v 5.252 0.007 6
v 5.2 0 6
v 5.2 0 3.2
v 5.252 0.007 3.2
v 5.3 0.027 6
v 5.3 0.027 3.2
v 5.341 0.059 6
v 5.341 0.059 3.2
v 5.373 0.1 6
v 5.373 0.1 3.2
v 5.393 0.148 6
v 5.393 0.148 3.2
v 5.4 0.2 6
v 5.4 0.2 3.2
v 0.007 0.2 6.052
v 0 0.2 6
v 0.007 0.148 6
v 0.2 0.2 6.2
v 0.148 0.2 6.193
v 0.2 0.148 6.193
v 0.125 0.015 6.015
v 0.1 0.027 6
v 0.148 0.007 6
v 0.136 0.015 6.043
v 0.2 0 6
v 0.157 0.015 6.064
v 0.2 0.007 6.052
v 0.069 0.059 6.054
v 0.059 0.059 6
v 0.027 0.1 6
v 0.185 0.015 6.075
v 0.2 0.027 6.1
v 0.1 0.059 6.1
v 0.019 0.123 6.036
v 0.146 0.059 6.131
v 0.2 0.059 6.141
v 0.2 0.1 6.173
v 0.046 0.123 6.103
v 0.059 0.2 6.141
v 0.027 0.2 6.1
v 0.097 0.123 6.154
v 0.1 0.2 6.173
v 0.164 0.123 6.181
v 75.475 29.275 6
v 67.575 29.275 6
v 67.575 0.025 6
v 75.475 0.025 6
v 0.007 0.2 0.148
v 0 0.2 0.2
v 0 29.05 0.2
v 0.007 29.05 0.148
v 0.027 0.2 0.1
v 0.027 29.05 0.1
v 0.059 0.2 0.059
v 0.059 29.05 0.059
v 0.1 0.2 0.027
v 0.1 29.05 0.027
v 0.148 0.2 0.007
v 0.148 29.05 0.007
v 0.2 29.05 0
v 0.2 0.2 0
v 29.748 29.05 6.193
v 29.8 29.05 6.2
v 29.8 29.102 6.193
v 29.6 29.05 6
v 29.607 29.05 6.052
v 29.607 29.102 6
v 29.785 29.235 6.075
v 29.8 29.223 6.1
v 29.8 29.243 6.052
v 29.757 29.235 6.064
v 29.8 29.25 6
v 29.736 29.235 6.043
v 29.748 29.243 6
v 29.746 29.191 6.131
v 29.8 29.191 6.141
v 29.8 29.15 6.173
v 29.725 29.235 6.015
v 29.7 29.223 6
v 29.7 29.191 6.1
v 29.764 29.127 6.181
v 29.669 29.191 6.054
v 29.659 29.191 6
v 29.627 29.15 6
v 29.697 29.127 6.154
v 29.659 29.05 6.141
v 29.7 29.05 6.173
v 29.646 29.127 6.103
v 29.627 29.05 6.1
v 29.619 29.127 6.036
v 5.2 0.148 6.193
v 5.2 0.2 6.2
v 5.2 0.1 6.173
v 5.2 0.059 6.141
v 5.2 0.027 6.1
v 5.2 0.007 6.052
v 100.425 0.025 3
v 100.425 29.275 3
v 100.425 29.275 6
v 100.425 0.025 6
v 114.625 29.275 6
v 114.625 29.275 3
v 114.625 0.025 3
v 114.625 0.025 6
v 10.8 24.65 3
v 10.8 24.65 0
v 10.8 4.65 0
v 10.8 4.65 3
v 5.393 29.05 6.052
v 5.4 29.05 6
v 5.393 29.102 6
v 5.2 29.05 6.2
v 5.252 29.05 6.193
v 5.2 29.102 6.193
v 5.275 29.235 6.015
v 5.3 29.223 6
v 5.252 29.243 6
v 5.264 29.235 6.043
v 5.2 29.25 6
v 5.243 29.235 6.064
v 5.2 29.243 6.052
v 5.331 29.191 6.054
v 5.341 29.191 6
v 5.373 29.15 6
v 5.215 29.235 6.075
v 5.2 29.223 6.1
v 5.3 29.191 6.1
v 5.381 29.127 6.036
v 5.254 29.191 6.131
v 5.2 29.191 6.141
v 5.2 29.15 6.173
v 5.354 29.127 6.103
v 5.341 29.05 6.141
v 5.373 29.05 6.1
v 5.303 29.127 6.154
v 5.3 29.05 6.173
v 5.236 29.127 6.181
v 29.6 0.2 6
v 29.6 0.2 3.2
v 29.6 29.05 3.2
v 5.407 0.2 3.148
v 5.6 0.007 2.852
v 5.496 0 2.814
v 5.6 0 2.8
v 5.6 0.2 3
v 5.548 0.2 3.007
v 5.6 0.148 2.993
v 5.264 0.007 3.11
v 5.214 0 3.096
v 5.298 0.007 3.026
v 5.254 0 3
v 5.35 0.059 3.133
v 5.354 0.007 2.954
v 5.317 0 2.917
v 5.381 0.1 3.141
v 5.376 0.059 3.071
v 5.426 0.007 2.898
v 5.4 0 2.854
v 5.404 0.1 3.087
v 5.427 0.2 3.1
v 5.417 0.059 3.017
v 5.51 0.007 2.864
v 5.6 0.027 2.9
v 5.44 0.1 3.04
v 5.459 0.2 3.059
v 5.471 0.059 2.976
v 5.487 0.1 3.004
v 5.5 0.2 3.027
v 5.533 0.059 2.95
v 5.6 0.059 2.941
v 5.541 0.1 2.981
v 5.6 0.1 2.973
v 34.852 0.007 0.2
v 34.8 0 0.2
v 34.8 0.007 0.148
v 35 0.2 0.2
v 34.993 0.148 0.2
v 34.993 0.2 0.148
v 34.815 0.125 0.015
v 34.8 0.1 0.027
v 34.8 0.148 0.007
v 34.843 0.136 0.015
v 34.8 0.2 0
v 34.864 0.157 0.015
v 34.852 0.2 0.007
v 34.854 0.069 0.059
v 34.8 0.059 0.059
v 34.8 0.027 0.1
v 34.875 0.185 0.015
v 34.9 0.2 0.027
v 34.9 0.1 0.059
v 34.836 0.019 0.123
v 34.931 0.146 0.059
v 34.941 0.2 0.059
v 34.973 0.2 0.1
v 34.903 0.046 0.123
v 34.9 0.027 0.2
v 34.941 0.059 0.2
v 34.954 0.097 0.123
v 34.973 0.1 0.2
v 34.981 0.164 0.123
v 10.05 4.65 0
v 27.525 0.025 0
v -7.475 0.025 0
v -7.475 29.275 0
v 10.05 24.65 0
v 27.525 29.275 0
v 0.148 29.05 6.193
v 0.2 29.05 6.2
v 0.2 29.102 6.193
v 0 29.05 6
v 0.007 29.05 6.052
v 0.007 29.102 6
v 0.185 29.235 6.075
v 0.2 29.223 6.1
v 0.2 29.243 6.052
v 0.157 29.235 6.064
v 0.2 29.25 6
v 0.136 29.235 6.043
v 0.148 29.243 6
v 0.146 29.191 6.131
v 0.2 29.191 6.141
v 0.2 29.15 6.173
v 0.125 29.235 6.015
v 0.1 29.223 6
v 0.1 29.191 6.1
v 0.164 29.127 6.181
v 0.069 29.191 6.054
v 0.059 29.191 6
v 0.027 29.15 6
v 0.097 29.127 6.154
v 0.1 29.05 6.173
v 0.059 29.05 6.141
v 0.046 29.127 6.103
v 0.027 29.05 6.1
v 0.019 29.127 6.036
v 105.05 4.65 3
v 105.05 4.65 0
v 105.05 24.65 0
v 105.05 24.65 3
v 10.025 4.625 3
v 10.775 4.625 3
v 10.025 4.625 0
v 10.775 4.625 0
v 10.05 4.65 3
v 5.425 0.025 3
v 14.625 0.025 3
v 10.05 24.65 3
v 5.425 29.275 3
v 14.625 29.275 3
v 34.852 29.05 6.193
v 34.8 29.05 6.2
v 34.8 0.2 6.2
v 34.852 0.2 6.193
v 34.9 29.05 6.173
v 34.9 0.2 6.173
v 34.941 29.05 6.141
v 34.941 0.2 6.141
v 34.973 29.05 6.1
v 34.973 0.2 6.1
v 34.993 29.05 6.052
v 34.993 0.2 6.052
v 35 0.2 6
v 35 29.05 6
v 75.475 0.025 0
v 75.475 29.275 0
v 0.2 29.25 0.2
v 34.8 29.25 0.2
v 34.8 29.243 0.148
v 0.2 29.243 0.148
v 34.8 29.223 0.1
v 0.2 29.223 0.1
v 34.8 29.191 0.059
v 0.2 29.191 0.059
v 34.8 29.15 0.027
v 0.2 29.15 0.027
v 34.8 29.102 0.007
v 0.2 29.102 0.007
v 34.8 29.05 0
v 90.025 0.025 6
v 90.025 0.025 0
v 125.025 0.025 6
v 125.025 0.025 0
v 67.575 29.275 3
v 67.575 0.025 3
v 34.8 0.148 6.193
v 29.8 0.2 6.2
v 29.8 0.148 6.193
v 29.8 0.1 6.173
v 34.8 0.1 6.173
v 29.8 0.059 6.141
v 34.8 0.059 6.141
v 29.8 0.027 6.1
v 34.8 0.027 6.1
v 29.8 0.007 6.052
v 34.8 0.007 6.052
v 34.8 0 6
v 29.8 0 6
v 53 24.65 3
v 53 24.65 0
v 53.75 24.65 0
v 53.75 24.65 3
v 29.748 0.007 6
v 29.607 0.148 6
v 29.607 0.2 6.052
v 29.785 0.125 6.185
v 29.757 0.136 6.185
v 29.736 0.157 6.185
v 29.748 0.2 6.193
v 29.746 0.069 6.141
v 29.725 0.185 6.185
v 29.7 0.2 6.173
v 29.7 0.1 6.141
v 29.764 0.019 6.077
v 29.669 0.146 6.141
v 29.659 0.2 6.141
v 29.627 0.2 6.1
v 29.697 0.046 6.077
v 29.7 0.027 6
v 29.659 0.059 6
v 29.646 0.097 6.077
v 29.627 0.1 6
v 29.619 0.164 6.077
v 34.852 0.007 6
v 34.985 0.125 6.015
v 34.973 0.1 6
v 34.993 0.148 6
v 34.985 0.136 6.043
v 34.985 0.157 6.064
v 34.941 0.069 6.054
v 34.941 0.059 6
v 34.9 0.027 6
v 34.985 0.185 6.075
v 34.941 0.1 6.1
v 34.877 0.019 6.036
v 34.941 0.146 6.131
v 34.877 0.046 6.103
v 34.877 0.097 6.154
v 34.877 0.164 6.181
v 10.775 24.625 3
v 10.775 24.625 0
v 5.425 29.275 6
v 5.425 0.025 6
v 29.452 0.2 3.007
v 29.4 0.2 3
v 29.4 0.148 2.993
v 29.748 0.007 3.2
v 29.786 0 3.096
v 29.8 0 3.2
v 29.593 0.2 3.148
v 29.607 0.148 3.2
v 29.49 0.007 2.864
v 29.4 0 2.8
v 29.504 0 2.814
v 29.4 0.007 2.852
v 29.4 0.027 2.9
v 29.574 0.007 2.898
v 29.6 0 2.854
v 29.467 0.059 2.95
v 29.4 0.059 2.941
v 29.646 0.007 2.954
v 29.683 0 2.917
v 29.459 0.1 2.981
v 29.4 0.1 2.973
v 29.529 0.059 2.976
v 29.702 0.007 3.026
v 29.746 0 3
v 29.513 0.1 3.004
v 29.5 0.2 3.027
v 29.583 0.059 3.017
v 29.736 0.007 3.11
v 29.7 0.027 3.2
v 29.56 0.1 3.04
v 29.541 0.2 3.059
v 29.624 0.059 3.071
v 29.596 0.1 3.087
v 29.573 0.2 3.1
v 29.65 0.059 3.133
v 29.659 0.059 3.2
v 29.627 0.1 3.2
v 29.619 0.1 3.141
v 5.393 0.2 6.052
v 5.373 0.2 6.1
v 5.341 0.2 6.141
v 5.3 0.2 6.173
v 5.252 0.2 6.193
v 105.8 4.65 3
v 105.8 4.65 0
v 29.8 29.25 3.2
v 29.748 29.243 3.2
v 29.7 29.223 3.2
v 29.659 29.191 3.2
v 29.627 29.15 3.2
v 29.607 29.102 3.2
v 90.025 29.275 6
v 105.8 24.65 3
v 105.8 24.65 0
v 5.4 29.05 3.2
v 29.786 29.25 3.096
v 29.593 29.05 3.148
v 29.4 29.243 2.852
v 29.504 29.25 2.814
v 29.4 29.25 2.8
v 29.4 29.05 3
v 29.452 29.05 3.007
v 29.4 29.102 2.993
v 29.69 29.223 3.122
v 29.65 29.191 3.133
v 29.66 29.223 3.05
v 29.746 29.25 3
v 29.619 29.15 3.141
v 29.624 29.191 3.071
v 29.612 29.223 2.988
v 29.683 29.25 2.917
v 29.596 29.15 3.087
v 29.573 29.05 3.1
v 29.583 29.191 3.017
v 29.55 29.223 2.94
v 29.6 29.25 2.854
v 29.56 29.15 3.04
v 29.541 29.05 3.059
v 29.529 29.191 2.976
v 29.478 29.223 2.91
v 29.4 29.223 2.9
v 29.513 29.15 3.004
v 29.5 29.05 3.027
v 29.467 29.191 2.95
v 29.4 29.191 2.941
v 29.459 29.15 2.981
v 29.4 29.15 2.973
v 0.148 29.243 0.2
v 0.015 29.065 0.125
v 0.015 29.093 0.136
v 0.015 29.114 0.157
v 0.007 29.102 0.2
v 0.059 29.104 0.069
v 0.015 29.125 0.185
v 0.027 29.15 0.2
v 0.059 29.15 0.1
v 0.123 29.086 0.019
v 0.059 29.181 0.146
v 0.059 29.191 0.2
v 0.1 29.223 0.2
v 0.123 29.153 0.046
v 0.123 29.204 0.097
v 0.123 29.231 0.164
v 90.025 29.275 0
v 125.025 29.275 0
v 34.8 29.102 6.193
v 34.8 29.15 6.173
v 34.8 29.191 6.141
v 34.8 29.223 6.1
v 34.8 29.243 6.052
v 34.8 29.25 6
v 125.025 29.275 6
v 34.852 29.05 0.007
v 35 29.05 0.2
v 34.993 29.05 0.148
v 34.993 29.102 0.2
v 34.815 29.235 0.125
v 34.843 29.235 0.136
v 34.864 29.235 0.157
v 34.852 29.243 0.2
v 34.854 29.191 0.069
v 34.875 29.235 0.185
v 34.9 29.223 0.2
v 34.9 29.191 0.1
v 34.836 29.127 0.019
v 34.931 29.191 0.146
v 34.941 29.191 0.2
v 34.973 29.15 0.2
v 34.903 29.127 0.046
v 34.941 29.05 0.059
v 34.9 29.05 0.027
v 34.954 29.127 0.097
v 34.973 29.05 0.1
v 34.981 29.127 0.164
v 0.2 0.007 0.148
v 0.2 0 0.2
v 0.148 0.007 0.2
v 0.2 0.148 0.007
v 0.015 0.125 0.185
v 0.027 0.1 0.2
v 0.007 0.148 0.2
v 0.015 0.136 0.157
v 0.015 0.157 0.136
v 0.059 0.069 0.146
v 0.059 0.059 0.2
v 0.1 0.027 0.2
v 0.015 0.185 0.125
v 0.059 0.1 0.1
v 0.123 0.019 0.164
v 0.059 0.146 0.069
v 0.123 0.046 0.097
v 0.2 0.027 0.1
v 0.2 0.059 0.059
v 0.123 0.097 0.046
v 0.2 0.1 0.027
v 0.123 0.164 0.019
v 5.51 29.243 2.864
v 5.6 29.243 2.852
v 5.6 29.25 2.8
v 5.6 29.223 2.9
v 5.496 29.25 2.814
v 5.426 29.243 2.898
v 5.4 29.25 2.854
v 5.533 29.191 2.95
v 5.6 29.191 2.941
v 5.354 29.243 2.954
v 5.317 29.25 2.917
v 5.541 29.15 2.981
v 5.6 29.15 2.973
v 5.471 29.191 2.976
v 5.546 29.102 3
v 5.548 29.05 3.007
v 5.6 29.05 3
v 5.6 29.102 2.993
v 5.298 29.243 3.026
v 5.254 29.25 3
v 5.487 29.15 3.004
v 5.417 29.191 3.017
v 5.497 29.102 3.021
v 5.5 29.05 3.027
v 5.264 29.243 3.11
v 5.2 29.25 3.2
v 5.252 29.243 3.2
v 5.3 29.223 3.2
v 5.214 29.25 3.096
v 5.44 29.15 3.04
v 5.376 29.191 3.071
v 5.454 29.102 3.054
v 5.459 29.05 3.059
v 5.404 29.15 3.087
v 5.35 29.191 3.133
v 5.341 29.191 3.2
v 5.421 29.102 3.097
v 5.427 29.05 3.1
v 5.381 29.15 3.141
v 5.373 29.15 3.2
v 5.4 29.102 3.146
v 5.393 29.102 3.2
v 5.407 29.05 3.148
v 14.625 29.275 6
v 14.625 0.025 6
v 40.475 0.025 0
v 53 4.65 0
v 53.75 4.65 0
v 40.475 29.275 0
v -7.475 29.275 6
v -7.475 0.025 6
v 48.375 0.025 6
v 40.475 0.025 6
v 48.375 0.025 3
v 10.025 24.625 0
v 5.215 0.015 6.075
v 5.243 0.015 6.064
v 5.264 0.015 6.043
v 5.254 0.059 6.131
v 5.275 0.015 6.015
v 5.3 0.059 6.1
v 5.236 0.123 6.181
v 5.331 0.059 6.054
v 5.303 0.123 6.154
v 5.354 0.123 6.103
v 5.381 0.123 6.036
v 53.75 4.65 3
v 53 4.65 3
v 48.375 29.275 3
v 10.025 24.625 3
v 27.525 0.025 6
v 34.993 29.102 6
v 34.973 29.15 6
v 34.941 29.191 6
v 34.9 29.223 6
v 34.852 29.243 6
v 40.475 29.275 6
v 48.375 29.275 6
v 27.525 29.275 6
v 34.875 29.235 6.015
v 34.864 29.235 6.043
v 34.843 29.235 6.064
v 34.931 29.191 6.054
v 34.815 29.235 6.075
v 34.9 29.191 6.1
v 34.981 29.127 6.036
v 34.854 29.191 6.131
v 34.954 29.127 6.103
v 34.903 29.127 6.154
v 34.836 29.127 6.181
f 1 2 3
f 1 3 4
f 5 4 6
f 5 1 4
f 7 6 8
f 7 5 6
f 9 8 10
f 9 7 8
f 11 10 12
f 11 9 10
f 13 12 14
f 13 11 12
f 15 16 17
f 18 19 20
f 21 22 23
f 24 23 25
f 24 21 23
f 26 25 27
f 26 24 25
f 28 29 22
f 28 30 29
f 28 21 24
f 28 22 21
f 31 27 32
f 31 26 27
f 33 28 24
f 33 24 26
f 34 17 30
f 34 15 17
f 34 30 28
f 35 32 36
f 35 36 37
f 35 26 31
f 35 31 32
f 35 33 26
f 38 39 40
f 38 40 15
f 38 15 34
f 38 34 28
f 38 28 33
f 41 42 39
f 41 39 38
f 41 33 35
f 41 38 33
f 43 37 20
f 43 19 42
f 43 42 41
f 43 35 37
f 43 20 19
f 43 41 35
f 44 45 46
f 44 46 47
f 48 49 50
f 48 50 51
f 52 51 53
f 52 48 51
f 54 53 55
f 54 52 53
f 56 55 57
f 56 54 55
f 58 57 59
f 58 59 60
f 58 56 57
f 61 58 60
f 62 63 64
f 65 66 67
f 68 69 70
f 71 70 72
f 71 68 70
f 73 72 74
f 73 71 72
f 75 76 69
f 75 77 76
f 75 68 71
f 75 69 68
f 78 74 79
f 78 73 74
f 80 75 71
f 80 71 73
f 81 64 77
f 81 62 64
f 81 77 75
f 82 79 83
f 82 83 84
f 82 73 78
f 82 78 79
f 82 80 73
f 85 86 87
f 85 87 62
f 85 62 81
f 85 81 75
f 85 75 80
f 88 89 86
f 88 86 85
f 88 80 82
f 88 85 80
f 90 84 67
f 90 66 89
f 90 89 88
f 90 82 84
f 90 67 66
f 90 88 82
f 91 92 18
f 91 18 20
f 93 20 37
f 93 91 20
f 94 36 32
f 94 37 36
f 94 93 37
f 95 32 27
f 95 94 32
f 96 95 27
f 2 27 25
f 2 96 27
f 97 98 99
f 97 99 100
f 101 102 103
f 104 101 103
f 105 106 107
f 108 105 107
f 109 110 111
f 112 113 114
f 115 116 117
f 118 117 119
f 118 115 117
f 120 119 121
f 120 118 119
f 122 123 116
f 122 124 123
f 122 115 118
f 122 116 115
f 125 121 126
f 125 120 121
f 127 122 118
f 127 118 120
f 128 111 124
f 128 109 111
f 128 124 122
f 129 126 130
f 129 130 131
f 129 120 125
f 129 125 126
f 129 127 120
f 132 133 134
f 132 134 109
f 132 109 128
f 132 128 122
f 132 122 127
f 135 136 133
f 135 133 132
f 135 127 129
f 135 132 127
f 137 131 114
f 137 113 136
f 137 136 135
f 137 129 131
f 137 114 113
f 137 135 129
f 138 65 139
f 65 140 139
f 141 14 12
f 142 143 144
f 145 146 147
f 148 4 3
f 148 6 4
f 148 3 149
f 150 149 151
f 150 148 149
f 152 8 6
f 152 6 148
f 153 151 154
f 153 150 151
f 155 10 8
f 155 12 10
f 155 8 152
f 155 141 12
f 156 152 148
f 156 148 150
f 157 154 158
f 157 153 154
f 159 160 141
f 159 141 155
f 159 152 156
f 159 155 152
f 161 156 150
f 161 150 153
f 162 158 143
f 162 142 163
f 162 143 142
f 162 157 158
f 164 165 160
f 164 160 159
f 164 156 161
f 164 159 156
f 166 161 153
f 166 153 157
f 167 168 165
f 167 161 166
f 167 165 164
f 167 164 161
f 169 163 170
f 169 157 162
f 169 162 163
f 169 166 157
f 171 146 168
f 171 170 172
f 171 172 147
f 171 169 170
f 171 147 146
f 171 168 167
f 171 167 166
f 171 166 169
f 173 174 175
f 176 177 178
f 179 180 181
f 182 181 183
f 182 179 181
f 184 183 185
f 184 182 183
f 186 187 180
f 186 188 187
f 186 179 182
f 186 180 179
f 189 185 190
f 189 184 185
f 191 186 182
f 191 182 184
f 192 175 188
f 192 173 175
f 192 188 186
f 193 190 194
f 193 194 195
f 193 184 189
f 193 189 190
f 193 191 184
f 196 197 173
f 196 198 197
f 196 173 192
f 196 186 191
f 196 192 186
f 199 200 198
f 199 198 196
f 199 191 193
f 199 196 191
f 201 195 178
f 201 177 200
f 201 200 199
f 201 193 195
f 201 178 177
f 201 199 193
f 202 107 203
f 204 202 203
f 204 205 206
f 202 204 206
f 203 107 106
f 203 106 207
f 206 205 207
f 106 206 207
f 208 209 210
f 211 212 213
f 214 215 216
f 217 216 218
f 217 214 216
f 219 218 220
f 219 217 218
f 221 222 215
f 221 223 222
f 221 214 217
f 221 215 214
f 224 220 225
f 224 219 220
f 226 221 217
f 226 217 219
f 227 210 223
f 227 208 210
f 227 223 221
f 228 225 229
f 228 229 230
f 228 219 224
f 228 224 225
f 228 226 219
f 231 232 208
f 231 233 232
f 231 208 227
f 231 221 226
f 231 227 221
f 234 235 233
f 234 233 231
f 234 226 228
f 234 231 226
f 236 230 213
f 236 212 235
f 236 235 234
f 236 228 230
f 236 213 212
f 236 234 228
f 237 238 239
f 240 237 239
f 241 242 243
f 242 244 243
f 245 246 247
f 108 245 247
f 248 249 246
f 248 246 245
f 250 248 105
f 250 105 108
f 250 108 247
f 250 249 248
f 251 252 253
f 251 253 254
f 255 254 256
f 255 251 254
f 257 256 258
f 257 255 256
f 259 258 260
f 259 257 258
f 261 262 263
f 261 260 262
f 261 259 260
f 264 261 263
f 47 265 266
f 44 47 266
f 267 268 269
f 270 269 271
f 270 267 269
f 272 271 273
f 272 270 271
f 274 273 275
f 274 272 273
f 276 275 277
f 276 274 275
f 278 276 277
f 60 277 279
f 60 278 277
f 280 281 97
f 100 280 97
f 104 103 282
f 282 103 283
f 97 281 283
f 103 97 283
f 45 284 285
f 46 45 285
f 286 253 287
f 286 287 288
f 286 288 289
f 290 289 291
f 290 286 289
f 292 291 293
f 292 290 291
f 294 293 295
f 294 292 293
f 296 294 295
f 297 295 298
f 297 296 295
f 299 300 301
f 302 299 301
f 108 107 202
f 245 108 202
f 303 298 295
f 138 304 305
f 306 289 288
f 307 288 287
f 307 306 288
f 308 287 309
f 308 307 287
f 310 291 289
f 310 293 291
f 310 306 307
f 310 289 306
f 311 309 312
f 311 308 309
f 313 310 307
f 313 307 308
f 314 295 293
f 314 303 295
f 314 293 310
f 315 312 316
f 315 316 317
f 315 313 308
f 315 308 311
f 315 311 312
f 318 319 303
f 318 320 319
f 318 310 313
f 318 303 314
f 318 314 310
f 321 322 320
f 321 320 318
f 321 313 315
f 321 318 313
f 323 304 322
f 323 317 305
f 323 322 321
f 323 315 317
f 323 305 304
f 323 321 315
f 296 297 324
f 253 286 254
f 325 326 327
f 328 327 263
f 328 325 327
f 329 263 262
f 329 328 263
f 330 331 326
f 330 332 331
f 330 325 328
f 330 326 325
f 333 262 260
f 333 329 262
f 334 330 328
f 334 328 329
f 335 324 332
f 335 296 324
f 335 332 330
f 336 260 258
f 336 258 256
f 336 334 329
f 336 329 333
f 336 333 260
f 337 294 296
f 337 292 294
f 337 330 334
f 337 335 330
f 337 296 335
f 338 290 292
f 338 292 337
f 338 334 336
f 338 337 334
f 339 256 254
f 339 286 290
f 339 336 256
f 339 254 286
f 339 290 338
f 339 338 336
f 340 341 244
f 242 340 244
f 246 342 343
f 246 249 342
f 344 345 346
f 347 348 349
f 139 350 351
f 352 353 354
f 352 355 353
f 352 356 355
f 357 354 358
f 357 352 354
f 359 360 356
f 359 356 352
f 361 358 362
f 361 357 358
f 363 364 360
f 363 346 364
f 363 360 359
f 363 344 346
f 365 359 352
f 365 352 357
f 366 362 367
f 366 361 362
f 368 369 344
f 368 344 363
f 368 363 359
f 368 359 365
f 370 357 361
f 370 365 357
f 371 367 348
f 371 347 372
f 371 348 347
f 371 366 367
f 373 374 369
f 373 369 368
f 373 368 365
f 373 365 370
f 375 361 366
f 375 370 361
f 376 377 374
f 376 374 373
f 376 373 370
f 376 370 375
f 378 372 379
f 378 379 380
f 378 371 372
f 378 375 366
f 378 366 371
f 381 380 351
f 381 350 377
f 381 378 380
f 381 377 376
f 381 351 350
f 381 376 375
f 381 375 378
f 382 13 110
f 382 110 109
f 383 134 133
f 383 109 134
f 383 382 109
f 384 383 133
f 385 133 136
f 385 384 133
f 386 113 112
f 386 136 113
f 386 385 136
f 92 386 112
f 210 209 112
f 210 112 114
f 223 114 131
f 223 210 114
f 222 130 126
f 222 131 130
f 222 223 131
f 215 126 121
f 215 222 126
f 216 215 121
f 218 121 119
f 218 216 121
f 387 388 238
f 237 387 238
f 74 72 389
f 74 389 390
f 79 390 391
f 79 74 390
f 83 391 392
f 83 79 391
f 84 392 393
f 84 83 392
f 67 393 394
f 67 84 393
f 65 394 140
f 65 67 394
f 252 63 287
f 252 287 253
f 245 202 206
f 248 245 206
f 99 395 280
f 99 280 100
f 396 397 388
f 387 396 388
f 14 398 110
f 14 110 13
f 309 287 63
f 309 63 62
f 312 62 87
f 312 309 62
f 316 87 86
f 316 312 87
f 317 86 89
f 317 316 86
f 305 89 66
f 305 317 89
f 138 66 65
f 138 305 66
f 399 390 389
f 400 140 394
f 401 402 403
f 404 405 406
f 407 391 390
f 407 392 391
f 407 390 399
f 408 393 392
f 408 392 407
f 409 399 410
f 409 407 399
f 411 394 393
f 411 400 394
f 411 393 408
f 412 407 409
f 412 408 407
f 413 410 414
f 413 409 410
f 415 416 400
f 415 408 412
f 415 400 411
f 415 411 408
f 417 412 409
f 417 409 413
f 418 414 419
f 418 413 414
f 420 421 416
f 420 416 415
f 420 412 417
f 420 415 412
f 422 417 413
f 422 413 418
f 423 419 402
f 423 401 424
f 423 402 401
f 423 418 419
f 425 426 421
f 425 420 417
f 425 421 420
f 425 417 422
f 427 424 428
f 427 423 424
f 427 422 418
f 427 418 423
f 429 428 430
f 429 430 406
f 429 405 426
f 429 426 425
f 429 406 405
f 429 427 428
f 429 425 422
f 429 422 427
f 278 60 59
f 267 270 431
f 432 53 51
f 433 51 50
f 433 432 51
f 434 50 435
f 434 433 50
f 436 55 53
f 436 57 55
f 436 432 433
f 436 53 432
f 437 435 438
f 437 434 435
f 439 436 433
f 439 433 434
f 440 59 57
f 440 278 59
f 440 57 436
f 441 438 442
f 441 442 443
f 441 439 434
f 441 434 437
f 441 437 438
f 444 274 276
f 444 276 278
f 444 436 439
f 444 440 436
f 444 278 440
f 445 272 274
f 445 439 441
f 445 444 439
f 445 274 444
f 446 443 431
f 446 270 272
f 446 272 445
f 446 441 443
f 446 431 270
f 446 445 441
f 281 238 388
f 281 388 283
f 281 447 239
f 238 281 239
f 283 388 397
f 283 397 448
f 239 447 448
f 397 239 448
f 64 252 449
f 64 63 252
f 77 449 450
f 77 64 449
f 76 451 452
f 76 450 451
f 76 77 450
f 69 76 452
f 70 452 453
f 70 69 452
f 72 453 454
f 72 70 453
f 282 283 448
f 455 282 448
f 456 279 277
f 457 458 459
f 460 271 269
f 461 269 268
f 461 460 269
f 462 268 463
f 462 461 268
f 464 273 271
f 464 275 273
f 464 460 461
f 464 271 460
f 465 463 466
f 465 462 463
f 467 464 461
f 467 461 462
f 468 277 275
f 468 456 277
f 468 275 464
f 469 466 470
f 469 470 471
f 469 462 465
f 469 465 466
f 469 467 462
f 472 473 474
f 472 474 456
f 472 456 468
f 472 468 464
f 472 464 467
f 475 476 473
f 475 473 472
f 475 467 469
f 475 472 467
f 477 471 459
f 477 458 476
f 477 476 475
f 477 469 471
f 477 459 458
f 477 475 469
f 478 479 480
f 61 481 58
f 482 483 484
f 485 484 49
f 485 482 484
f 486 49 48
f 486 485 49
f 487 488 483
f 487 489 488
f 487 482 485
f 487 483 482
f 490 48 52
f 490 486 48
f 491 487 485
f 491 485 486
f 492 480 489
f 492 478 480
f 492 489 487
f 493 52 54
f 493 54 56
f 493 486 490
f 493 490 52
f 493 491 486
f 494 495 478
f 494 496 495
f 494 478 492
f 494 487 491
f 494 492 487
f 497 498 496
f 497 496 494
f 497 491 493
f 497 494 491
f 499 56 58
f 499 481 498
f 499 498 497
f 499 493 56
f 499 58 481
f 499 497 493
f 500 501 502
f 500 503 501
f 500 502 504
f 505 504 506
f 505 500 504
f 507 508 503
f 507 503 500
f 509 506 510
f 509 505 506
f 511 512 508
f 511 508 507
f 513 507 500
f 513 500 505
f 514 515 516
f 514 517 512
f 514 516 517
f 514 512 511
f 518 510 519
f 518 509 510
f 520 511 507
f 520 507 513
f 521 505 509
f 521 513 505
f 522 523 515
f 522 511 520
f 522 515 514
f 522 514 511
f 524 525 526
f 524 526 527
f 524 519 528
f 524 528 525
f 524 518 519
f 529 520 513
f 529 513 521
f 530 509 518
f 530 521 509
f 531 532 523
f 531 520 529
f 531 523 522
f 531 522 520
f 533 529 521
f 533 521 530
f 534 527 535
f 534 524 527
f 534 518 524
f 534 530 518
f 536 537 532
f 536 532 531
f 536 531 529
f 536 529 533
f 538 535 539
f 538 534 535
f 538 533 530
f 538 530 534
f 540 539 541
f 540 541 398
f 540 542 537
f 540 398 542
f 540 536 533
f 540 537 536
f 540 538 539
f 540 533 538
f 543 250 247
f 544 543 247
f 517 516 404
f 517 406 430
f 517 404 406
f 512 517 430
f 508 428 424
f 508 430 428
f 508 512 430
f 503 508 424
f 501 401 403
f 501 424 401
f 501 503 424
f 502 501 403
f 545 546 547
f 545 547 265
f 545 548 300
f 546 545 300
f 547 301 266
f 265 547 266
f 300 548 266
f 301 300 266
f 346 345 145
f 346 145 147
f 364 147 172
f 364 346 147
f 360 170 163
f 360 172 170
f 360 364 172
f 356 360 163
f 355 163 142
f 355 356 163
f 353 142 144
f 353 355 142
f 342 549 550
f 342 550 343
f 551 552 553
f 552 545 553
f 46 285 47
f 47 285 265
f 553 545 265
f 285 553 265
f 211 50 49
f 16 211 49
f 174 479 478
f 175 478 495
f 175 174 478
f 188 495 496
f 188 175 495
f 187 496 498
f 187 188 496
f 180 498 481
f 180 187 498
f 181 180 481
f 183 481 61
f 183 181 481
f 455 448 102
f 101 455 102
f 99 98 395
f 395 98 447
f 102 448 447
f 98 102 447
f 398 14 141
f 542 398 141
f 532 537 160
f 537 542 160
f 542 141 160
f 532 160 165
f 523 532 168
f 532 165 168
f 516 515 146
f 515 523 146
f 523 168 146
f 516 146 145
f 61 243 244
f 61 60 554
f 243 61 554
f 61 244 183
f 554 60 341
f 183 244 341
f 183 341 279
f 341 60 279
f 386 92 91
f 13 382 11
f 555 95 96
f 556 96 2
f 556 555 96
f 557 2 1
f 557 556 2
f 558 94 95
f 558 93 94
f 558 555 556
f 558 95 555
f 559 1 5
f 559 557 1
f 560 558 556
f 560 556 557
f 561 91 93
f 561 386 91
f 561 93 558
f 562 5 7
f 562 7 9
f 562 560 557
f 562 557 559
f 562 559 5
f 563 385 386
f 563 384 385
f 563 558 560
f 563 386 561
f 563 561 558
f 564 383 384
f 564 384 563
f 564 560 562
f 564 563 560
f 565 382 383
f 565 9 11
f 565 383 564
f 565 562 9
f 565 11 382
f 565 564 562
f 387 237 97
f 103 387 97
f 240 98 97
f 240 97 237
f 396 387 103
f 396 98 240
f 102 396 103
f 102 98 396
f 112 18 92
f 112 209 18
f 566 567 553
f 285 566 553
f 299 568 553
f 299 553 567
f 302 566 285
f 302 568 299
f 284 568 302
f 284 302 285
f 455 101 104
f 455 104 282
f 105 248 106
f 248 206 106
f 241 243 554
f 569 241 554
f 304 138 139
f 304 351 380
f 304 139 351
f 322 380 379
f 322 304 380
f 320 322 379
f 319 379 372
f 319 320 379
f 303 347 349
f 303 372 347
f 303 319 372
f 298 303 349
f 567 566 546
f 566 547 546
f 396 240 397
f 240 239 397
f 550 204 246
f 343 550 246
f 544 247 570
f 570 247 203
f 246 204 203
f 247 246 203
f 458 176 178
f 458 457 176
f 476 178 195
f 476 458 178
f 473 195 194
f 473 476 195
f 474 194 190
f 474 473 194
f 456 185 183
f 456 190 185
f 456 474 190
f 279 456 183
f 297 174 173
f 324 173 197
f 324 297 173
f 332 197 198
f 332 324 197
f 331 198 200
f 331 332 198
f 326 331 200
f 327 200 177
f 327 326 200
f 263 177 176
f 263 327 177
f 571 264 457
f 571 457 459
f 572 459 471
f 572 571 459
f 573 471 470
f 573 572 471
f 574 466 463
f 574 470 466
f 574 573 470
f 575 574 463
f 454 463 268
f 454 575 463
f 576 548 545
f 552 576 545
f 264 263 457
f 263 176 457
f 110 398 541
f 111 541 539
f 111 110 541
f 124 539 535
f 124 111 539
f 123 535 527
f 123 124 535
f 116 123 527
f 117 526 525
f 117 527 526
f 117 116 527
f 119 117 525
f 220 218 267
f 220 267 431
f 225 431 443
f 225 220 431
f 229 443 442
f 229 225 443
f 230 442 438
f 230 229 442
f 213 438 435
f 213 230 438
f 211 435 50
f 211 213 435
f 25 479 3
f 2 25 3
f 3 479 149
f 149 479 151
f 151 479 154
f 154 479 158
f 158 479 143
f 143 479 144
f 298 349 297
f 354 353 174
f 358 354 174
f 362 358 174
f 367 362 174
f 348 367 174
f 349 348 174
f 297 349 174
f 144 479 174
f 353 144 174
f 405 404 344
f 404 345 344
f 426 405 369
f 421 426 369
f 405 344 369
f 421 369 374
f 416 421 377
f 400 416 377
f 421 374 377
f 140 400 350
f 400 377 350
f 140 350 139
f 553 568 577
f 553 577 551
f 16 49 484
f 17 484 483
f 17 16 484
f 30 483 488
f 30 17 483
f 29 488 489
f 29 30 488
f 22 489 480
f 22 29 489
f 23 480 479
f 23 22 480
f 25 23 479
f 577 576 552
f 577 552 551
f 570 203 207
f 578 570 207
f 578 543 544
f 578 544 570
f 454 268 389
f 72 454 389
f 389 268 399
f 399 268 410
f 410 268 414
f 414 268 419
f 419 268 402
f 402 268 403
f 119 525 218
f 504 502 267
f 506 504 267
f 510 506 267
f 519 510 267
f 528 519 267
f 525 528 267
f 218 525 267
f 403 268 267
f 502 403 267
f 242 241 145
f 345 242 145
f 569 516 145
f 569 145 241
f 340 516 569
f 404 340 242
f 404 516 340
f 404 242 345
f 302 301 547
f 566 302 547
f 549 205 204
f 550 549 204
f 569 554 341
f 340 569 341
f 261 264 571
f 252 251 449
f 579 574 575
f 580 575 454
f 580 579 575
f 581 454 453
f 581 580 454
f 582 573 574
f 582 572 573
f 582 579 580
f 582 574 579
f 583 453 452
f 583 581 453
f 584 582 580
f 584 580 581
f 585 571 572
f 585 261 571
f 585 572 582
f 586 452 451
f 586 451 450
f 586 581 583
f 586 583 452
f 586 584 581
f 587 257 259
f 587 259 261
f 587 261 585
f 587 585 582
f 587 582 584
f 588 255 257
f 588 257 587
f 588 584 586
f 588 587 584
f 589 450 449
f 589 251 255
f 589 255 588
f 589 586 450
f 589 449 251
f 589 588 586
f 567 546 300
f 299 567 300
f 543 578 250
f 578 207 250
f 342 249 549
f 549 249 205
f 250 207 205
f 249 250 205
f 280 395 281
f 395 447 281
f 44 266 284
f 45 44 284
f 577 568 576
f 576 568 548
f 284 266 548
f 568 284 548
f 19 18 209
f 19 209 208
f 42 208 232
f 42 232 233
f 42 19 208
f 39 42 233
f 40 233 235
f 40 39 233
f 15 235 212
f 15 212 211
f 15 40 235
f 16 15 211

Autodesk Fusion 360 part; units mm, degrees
sketch "24mm_guide" plane through (0, 0, 0) normal (0, 0, 1) x (1, 0, 0)
  line L0 (0, 0) -> (35, 0)
  line L1 (35, 0) -> (35, 29.25)
  line L2 (35, 29.25) -> (0, 29.25)
  line L3 (0, 29.25) -> (0, 0)
  line L4 (5.4, 29.25) -> (5.4, 0)
  line L5 (29.6, 29.25) -> (29.6, 0)
  line L6 (10.025, 24.625) -> (10.775, 24.625)
  line L7 (10.775, 24.625) -> (10.775, 4.625)
  line L8 (10.775, 4.625) -> (10.025, 4.625)
  line L9 (10.025, 4.625) -> (10.025, 24.625)
  dimension "d1" = 24.2
  dimension "d11" = 0.75
  dimension "d12" = 20
  dimension "d13" = 4.625
  dimension "d15" = 4.625
  dimension "d22" = 4.625
  dimension "d32" = 35
  dimension "d34" = 5.4
  dimension "d35" = 5.4
extrude "Extrude1" add sketch "24mm_guide" along normal blind 6.2 contours L0 L2 L3 L4 | L0 L1 L2 L5 makes body 1 at (0, 9.75, 4.1333) makes body 2 at (29.6, 9.75, 4.1333)
extrude "Extrude2" add sketch "24mm_guide" along normal blind 3 contours L0 L2 L4 L5 bodies 1 2
fillet "Fillet1" radius 0.2 24 edges at (5.4, 14.625, 6.2) (0, 14.625, 6.2) (2.7, 0, 6.2) (2.7, 29.25, 6.2) (5.4, 14.625, 3) (5.4, 0, 4.6) (17.5, 0, 3) (29.6, 0, 4.6) (32.3, 0, 6.2) (35, 0, 3.1) (17.5, 0, 0) (0, 0, 3.1) (17.5, 29.25, 3) (5.4, 29.25, 4.6) (35, 14.625, 6.2) (29.6, 14.625, 6.2) (35, 14.625, 0) (29.6, 29.25, 4.6) (32.3, 29.25, 6.2) (35, 29.25, 3.1) (17.5, 29.25, 0) (0, 29.25, 3.1) (29.6, 14.625, 3) (0, 14.625, 0) on bodies 1
copy_body "Body->Comp1" bodies 1 removing the originals makes body 3 in component "24mm_guide"
sketch "19mm_guide" plane through (0, 0, 0) normal (0, 0, 1) x (1, 0, 0)
  line L0 (-2.525, 0.025) -> (32.475, 0.025)
  line L1 (24.575, 29.275) -> (24.575, 0)
  line L2 (32.475, 0.025) -> (32.475, 29.275)
  line L3 (-2.525, 29.275) -> (-2.525, 0.025)
  line L4 (10, 4.65) -> (10, 24.65)
  line L5 (32.475, 29.275) -> (-2.525, 29.275)
  line L6 (10, 24.65) -> (10.75, 24.65)
  line L7 (5.375, 29.275) -> (5.375, 0)
  line L8 (10.75, 24.65) -> (10.75, 4.65)
  line L9 (10.75, 4.65) -> (10, 4.65)
  point P0 (-2.525, 0.025)
  dimension "d36" = 19.2
  dimension "d37" = 0.75
  dimension "d38" = 20
  dimension "d39" = 4.625
  dimension "d40" = 4.625
  dimension "d41" = 4.625
  dimension "d42" = 35
  dimension "d43" = 7.9
extrude "Extrude3" add sketch "19mm_guide" along normal blind 6 separate body contours L0 L3 L5 L7 | L0 L1 L2 L5 makes body 4 at (0.1083, 19.525, 0) makes body 5 at (27.2083, 19.525, 0)
extrude "Extrude4" add sketch "19mm_guide" along normal blind 3 contours L0 L1 L5 L7 bodies 4 5
copy_body "Body->Comp2" bodies 4 removing the originals makes body 6 in component "19mm_guide"
sketch "14mm_guide" plane through (0, 0, 0) normal (0, 0, 1) x (1, 0, 0)
  line L0 (30.025, 29.275) -> (-4.975, 29.275)
  line L1 (10.8, 24.65) -> (10.8, 4.65)
  line L2 (30.025, 0.025) -> (30.025, 29.275)
  line L3 (10.05, 4.65) -> (10.05, 24.65)
  line L4 (10.8, 4.65) -> (10.05, 4.65)
  line L5 (19.625, 29.275) -> (19.625, 0)
  line L6 (5.425, 29.275) -> (5.425, 0)
  line L7 (-4.975, 0.025) -> (30.025, 0.025)
  line L8 (10.05, 24.65) -> (10.8, 24.65)
  line L9 (-4.975, 29.275) -> (-4.975, 0.025)
  point P0 (-4.975, 0.025)
  dimension "d49" = 14.2
  dimension "d50" = 0.75
  dimension "d51" = 20
  dimension "d52" = 4.625
  dimension "d53" = 4.625
  dimension "d54" = 4.625
  dimension "d55" = 35
  dimension "d56" = 10.4
extrude "Extrude5" add sketch "14mm_guide" along normal blind 6 separate body contours L0 L2 L5 L7 | L0 L6 L7 L9 makes body 7 at (-1.5083, 19.525, 0) makes body 8 at (23.0917, 19.525, 0)
extrude "Extrude6" add sketch "14mm_guide" along normal blind 3 contours L0 L5 L6 L7 bodies 7 8
copy_body "Body->Comp3" bodies 7 removing the originals makes body 9 in component "14mm_guide"
sketch "9mm_guide" plane through (0, 0, 0) normal (0, 0, 1) x (1, 0, 0)
  line L0 (14.625, 29.275) -> (14.625, 0)
  line L1 (-7.475, 0.025) -> (27.525, 0.025)
  line L2 (10.8, 24.65) -> (10.8, 4.65)
  line L3 (10.8, 4.65) -> (10.05, 4.65)
  line L4 (27.525, 0.025) -> (27.525, 29.275)
  line L5 (27.525, 29.275) -> (-7.475, 29.275)
  line L6 (10.05, 24.65) -> (10.8, 24.65)
  line L7 (5.425, 29.275) -> (5.425, 0)
  line L8 (10.05, 4.65) -> (10.05, 24.65)
  line L9 (-7.475, 29.275) -> (-7.475, 0.025)
  point P0 (-7.475, 0.025)
  dimension "d63" = 9.2
  dimension "d64" = 0.75
  dimension "d65" = 20
  dimension "d66" = 4.625
  dimension "d67" = 4.625
  dimension "d68" = 4.625
  dimension "d69" = 35
  dimension "d70" = 12.9
extrude "Extrude7" add sketch "9mm_guide" along normal blind 6 separate body contours L0 L1 L4 L5 | L1 L5 L7 L9 makes body 10 at (-3.175, 19.525, 0) makes body 11 at (18.925, 19.525, 0)
extrude "Extrude8" add sketch "9mm_guide" along normal blind 3 contours L0 L1 L5 L7 bodies 10 11
copy_body "Body->Comp4" bodies 10 removing the originals makes body 12 in component "9mm_guide"
component "24mm_guide" placed x (1, 0, 0) y (0, 1, 0) z (0, 0, 1) at (0, 0, 0)
component "19mm_guide" placed x (1, 0, 0) y (0, 1, 0) z (0, 0, 1) at (43, 0, 0)
component "14mm_guide" placed x (1, 0, 0) y (0, 1, 0) z (0, 0, 1) at (95, 0, 0)
component "9mm_guide" placed x (1, 0, 0) y (0, 1, 0) z (0, 0, 1) at (0, 0, 0)
equation "d1 = tape_24 + tolerance"
equation "tape_24 = 24 mm"
equation "tolerance = 0.2 mm"
equation "tape_thickness = 3 mm"
equation "bumpers = 5 mm"
equation "roof_thickness = 3 mm"
equation "slot_width = 0.55 mm"
equation "slot_lenght = 20 mm"
equation "d11 = slot_width + tolerance"
equation "d12 = slot_lenght"
equation "d13 = strip_width - ( ( slot_width + tolerance ) / 2 )"
equation "strip_width = 5 mm"
equation "d15 = d13"
equation "d16 = roof_thickness + tape_thickness + tolerance"
equation "d18 = roof_thickness"
equation "d22 = d15"
equation "d32 = body_width"
equation "body_width = 35 mm"
equation "d34 = ( body_width - ( tape_24 + tolerance ) ) / 2"
equation "d36 = tape_19mm + tolerance"
equation "d37 = slot_width + tolerance"
equation "d38 = slot_lenght"
equation "d39 = strip_width - ( ( slot_width + tolerance ) / 2 )"
equation "d40 = d13"
equation "d41 = d15"
equation "d42 = body_width"
equation "d43 = ( body_width - ( tape_19mm + tolerance ) ) / 2"
equation "tape_19mm = 19 mm"
equation "d45 = roof_thickness + tape_thickness"
equation "d47 = roof_thickness"
equation "d49 = tape_14 + tolerance"
equation "d50 = slot_width + tolerance"
equation "d51 = slot_lenght"
equation "d52 = strip_width - ( ( slot_width + tolerance ) / 2 )"
equation "d53 = d13"
equation "d54 = d15"
equation "d55 = body_width"
equation "d56 = ( body_width - ( tape_14 + tolerance ) ) / 2"
equation "tape_14 = 14 mm"
equation "d58 = roof_thickness + tape_thickness"
equation "d60 = roof_thickness"
equation "tape_9 = 9 mm"
equation "d63 = tape_9 + tolerance"
equation "d64 = slot_width + tolerance"
equation "d65 = slot_lenght"
equation "d66 = strip_width - ( ( slot_width + tolerance ) / 2 )"
equation "d67 = d13"
equation "d68 = d15"
equation "d69 = body_width"
equation "d70 = ( body_width - ( tape_9 + tolerance ) ) / 2"
equation "d71 = roof_thickness + tape_thickness"
equation "d73 = roof_thickness"
